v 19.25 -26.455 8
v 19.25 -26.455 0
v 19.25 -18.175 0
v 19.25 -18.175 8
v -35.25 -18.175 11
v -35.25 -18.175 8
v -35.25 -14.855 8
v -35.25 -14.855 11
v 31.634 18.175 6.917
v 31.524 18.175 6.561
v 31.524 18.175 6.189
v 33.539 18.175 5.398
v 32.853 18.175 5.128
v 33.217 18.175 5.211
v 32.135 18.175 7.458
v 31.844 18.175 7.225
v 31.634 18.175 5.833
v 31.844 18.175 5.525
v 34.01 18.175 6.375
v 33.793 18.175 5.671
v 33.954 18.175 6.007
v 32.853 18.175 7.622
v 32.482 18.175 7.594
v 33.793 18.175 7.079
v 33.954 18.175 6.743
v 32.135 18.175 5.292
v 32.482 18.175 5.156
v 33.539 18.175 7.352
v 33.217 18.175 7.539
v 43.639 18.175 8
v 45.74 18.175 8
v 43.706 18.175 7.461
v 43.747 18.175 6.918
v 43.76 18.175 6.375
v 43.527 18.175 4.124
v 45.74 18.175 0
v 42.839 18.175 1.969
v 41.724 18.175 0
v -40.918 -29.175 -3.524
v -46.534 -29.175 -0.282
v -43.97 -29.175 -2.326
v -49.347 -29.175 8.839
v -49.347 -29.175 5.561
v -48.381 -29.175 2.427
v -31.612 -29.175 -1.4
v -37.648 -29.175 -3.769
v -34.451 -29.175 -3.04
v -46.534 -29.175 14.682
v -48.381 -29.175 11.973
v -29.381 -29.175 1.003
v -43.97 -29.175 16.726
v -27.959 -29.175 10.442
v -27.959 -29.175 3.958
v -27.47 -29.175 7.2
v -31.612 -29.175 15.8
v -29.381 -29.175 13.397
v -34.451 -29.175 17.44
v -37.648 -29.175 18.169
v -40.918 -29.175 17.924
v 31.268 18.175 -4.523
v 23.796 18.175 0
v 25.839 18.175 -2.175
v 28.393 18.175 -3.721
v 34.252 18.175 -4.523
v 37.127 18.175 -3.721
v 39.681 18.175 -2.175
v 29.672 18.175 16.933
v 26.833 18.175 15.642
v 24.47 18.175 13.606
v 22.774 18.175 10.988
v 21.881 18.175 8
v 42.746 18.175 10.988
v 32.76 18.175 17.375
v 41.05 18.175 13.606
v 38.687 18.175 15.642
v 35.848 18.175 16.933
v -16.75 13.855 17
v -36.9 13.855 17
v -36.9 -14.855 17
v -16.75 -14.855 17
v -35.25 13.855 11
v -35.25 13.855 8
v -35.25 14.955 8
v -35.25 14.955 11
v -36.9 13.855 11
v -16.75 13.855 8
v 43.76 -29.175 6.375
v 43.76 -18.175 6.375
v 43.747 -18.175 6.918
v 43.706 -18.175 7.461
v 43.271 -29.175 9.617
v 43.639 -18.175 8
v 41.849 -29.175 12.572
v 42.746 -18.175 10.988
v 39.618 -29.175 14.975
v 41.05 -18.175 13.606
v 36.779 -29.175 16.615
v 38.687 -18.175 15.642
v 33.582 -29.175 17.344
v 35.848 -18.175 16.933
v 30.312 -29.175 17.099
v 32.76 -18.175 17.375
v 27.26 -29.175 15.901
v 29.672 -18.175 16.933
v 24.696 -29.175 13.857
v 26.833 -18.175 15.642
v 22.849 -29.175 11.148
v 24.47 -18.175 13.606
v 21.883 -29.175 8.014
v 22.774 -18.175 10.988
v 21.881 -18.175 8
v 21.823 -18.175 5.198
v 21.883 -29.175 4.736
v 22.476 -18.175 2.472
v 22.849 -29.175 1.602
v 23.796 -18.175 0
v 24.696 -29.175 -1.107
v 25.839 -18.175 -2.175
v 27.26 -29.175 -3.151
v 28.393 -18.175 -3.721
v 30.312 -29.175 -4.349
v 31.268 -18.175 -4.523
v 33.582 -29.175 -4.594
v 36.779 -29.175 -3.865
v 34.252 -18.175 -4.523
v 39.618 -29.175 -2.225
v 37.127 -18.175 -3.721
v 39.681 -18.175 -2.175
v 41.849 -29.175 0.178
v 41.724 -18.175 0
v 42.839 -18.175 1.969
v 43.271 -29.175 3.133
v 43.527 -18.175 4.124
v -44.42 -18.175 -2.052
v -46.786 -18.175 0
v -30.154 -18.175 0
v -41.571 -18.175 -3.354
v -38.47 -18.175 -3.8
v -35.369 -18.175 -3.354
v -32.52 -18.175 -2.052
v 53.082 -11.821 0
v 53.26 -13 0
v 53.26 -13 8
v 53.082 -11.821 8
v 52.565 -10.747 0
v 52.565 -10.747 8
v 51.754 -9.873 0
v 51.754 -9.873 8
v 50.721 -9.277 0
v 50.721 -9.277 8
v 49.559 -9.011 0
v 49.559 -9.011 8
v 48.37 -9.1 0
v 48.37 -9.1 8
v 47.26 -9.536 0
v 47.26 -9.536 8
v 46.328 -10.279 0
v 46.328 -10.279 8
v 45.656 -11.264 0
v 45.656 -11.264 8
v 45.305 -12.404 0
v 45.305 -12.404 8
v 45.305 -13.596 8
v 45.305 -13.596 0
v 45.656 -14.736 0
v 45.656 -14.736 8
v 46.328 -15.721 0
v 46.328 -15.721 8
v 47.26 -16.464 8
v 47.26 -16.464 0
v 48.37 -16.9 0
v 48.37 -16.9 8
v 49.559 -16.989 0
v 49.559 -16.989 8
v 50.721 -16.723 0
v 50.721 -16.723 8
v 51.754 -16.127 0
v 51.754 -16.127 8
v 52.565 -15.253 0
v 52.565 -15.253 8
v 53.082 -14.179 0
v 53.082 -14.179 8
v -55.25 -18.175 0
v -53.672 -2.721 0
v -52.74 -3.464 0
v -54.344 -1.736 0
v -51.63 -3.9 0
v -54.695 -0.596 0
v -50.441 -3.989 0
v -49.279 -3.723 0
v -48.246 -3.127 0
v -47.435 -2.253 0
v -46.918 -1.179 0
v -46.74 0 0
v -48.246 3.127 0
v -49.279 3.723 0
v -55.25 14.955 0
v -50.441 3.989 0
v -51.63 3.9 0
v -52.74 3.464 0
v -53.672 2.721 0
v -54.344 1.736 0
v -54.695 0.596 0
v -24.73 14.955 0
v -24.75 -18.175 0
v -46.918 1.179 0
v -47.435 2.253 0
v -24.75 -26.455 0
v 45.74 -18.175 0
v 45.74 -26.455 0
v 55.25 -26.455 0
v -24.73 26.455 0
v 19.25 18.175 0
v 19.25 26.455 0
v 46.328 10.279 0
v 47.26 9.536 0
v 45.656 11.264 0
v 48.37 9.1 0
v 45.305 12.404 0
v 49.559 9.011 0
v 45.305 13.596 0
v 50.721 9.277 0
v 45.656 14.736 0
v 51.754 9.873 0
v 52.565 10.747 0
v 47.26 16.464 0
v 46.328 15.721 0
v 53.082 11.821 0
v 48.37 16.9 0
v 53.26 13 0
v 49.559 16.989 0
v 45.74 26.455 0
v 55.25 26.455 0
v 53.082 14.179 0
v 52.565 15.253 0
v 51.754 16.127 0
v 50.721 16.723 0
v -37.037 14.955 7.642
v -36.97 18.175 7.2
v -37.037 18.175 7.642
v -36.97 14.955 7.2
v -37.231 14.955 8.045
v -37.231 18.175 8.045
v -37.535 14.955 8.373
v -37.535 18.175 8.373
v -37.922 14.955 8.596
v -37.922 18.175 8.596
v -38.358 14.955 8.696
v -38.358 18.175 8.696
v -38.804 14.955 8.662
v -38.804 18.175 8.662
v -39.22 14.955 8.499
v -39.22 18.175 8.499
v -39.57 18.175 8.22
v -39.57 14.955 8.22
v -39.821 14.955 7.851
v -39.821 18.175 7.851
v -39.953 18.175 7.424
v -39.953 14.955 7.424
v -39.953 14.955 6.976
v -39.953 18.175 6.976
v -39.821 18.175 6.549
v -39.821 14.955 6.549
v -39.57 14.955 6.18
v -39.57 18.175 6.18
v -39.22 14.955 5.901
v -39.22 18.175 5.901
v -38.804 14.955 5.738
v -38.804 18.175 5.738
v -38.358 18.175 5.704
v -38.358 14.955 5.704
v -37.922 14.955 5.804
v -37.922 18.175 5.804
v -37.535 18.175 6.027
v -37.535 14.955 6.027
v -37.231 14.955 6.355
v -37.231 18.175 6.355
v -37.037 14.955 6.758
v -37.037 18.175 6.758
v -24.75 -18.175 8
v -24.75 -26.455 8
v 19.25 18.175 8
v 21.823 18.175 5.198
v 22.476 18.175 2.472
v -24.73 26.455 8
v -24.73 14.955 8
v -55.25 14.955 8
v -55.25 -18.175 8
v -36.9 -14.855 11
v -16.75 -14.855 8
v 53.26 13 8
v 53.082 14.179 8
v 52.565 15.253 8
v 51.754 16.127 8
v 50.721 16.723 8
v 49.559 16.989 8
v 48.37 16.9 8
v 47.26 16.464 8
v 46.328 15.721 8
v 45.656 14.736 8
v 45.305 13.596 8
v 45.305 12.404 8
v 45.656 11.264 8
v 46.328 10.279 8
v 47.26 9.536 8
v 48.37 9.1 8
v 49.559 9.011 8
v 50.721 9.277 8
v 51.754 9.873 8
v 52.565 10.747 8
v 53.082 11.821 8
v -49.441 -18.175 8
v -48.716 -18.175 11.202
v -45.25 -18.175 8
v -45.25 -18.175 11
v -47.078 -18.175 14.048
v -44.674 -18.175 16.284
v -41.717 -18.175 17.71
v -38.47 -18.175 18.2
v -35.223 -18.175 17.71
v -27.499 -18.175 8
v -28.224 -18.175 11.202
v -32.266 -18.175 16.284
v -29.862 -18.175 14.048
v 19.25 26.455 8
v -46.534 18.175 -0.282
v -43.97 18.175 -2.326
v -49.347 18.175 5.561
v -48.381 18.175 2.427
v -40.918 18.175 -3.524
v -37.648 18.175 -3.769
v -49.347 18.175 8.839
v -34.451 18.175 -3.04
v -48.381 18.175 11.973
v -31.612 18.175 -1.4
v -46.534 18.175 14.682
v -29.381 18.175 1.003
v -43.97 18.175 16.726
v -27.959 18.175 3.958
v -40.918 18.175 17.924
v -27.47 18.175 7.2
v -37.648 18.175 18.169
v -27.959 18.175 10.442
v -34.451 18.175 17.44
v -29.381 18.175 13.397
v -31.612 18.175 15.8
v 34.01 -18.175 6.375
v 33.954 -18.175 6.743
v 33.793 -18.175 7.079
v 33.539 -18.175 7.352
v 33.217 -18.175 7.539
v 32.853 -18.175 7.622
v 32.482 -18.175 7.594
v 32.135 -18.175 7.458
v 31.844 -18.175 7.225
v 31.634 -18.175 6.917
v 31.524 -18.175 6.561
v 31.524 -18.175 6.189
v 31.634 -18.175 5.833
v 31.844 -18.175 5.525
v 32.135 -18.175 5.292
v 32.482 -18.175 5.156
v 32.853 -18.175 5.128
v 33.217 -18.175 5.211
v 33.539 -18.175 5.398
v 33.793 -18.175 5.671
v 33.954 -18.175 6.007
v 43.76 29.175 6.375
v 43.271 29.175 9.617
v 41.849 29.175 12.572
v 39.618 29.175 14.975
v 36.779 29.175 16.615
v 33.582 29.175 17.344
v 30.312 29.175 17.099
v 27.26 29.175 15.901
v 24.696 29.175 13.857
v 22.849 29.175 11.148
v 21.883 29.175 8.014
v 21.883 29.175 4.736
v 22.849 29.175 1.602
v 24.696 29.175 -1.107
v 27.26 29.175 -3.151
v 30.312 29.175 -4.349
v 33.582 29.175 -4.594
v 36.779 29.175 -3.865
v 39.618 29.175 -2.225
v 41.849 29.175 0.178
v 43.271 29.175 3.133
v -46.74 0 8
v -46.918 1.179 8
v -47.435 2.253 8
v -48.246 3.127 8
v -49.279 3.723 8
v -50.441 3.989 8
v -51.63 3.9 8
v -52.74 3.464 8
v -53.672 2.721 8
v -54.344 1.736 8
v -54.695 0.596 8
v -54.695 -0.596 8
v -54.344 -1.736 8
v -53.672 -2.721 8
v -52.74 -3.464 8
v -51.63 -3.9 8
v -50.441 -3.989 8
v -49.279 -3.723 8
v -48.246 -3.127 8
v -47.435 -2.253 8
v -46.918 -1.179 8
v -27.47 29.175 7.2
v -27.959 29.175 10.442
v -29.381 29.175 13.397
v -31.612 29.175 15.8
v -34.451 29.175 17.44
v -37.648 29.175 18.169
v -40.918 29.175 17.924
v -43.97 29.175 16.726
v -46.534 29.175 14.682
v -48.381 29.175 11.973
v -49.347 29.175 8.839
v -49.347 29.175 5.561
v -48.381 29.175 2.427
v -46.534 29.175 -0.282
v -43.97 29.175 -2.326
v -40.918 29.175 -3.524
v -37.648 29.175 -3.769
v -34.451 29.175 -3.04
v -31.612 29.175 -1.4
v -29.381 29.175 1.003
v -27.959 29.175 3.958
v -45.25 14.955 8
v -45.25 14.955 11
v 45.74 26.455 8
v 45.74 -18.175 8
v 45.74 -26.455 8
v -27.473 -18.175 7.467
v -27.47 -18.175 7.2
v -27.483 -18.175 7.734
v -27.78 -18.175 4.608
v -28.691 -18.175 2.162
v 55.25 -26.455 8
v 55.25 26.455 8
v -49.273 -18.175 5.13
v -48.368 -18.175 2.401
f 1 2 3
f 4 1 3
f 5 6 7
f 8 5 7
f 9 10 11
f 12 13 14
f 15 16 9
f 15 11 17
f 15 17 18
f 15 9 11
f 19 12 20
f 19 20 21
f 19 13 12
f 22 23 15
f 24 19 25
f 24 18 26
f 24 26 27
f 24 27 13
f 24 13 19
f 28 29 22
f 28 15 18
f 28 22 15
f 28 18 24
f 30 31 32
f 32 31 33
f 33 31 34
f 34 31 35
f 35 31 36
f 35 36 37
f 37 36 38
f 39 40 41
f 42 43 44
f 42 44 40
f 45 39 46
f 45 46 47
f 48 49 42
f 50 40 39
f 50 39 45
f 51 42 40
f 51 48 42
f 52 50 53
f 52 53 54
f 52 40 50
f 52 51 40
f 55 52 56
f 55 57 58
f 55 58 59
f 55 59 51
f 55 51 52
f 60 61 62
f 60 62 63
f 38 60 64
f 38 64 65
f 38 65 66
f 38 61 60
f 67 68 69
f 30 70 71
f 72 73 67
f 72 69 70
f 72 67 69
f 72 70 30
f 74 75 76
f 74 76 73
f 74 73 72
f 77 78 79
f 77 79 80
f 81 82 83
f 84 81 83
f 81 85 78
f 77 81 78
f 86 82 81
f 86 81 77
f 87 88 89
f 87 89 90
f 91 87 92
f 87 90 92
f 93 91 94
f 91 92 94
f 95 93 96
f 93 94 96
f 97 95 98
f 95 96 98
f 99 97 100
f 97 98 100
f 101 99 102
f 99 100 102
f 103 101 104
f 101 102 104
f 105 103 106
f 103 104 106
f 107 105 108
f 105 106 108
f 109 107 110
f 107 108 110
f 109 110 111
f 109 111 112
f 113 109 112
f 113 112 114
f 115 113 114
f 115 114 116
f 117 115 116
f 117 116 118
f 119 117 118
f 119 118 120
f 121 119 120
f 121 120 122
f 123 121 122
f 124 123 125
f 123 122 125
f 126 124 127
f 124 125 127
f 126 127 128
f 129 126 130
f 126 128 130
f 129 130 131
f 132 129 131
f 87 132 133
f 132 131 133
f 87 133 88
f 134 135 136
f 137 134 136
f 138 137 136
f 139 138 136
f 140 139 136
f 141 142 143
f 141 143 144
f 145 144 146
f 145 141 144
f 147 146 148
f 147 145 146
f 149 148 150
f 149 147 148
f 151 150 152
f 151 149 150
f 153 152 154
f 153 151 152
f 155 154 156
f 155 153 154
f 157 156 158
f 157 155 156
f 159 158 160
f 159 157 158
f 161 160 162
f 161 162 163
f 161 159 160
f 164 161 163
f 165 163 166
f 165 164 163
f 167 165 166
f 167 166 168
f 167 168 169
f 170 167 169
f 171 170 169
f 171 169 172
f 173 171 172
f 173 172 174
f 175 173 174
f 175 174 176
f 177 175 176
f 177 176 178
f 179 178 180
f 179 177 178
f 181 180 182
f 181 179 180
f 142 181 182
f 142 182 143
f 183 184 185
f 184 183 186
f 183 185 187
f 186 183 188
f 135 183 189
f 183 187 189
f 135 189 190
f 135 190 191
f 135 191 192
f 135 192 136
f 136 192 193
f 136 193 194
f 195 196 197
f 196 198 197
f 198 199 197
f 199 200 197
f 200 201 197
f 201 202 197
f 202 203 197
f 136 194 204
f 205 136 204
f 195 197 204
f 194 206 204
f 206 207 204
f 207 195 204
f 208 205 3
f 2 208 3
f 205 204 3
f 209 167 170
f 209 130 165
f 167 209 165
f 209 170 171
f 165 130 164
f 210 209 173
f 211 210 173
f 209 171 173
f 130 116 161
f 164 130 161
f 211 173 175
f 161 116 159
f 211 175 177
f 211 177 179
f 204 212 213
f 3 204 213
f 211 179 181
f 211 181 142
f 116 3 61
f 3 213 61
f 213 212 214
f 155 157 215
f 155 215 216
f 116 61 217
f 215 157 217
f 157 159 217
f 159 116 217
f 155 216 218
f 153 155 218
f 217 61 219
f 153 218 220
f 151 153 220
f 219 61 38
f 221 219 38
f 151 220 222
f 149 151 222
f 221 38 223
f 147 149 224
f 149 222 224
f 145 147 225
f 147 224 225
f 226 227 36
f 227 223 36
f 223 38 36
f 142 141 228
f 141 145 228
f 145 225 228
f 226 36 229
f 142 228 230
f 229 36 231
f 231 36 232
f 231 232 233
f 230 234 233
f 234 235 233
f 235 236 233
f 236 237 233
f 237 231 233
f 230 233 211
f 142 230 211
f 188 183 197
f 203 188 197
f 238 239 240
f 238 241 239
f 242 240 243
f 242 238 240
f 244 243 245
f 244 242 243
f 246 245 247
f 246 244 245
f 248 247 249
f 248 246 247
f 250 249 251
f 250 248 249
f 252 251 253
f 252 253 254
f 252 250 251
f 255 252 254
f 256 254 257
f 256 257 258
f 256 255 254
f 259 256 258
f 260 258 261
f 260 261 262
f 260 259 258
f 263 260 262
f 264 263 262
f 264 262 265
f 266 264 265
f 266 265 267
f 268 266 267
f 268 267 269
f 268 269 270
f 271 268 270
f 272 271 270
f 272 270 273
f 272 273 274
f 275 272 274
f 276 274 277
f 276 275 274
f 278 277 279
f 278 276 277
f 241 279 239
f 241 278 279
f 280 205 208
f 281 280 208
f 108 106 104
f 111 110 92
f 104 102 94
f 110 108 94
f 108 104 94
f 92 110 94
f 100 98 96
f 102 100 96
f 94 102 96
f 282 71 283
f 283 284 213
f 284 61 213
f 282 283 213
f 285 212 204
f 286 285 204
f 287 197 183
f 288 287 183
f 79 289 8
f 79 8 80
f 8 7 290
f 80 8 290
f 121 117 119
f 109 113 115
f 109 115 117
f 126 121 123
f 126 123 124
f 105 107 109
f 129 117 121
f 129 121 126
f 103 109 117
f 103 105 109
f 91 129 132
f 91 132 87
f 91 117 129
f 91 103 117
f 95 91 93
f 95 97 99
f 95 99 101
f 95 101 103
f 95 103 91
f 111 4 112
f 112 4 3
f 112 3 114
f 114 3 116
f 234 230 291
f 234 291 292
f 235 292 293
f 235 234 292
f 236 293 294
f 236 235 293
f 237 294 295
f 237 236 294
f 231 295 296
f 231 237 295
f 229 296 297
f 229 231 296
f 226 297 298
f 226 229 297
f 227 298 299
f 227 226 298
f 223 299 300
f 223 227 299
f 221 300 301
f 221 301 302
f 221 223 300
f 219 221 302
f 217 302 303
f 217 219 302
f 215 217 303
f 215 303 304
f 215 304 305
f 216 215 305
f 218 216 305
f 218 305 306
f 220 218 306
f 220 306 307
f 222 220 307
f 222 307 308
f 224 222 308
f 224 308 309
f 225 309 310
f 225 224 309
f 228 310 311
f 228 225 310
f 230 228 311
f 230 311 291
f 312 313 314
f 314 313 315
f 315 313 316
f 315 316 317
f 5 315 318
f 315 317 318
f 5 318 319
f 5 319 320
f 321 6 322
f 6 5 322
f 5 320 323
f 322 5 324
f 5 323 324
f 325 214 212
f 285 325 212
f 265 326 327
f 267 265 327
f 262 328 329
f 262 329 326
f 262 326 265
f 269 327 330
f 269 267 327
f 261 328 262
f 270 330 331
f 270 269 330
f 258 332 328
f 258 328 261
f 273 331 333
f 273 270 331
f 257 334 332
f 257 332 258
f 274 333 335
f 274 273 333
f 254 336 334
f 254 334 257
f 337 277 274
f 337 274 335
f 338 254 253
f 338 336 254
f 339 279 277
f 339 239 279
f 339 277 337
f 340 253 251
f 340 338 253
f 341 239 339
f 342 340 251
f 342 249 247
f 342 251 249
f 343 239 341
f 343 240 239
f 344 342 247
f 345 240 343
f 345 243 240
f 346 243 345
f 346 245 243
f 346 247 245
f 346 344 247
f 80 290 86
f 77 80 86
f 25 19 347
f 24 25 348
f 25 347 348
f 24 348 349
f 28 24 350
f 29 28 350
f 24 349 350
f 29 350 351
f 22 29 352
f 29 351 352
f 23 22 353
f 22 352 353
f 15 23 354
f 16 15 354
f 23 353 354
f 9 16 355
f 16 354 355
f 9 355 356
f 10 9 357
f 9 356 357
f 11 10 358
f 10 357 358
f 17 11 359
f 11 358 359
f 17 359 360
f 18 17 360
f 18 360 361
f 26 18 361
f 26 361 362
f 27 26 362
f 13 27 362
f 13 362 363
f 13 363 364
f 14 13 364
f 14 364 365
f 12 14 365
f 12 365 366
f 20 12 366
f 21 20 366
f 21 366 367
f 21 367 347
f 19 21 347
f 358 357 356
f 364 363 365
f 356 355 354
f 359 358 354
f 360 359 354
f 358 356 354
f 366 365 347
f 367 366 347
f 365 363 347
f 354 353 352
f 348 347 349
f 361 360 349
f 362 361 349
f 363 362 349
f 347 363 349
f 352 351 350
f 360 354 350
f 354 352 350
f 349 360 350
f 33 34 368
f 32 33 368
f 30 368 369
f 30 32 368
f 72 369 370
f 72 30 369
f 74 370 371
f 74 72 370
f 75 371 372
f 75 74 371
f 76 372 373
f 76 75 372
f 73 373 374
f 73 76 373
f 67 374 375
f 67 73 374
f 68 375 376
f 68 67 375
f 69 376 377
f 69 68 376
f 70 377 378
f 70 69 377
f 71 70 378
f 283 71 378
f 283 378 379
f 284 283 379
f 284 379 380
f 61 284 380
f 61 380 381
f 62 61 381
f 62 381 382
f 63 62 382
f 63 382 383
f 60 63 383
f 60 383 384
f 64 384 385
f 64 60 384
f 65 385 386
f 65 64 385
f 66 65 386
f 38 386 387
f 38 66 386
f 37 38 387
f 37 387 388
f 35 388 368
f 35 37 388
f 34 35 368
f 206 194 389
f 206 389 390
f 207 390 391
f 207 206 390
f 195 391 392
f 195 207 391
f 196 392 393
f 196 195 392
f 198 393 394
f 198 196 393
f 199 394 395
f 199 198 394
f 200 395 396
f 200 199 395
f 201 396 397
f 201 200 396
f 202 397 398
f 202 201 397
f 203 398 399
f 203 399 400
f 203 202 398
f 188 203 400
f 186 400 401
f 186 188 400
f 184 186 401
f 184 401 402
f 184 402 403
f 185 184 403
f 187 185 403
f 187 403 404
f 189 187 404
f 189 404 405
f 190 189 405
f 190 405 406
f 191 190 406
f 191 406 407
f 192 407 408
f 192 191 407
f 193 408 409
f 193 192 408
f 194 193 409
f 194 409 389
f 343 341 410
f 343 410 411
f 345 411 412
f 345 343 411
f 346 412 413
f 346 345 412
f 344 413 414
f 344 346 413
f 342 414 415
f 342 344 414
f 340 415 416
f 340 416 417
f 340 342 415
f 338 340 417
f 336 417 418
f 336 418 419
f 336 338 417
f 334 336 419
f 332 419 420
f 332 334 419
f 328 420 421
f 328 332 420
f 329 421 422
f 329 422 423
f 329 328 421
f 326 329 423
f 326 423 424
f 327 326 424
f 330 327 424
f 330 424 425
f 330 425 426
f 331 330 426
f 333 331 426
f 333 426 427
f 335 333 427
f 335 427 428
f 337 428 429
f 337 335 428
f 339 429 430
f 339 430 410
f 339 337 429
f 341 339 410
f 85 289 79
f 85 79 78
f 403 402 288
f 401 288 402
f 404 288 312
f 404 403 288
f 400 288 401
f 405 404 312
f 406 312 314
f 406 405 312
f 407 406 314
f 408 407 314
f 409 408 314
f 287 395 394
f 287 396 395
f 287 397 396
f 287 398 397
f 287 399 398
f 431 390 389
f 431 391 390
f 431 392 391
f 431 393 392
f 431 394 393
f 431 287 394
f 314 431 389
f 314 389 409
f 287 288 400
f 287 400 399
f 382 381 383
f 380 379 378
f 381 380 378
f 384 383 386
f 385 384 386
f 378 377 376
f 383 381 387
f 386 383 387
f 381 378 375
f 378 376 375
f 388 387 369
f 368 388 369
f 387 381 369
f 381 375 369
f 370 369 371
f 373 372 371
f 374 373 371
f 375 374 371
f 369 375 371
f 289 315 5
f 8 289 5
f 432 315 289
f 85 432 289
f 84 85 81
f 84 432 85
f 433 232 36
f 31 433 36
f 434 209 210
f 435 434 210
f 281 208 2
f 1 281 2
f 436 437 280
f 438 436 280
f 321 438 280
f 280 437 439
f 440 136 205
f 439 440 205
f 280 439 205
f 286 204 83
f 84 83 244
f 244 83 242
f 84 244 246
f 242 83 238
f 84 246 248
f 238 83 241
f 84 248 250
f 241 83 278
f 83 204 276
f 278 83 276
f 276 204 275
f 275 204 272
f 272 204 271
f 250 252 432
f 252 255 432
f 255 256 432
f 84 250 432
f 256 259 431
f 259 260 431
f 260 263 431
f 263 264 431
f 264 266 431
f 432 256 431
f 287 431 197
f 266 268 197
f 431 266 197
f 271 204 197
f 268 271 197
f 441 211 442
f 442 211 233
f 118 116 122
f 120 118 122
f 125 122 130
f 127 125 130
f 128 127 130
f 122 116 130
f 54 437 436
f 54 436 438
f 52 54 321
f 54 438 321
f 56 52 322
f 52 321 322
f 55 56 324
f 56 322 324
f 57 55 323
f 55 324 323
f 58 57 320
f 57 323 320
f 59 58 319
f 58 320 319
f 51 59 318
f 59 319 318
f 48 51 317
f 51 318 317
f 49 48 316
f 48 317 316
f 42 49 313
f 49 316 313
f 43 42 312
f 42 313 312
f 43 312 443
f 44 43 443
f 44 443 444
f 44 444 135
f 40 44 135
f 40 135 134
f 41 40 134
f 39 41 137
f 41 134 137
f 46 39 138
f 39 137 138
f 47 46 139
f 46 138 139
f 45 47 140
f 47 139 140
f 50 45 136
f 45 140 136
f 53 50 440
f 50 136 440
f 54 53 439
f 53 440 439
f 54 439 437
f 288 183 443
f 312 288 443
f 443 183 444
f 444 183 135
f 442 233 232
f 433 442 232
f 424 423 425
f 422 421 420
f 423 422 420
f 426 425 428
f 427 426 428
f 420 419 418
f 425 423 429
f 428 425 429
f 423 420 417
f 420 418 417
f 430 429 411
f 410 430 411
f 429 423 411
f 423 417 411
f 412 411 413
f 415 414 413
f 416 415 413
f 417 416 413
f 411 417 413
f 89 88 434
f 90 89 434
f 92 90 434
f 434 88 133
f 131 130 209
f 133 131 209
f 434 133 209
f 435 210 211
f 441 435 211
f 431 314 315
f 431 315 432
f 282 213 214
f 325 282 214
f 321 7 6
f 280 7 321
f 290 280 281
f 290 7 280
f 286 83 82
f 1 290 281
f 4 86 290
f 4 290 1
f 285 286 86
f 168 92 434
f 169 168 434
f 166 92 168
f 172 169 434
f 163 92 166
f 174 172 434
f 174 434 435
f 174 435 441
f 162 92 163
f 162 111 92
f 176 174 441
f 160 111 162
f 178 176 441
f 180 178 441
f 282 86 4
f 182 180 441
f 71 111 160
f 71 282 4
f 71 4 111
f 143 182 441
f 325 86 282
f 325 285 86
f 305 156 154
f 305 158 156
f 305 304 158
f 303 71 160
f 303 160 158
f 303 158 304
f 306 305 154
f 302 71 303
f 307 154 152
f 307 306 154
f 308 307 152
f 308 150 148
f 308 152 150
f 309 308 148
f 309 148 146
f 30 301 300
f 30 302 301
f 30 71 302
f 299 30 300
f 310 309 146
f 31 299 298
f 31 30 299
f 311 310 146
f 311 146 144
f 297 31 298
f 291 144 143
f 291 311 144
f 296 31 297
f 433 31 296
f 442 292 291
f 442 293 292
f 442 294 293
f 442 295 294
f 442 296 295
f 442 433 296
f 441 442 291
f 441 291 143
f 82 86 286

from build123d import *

# Parameters (mm, degrees)
F0_R      = 4
F1_DEPTH  = 8
F2_W      = 10
F2_H      = 33.13
F3_DEPTH  = 3
F4_R      = 1.5
F5_DEPTH  = 26
F6_W      = 20.15
F6_H      = 28.71
F7_DEPTH  = 9
F8_R      = 11
F9_DEPTH  = 11
F10_R     = 1.25
F11_DEPTH = 47.351
F12_R     = 11
F13_DEPTH = 11


# Not quite as in the source:
# - a pattern or mirror of a feature is missing from the dataset's text; its kind, count and spacing are read off the source's solid


with BuildPart() as f1:
    # F0 (on Top) → F1 (new body)
    with BuildSketch(Plane.XY):
        Polygon((55.25, -26.455), (55.25, 26.455), (45.74, 26.455), (45.74, 18.175), (19.25, 18.175), (19.25, 26.455), (-24.73, 26.455), (-24.73, 14.955), (-55.25, 14.955), (-55.25, -18.175), (-24.75, -18.175), (-24.75, -26.455), (19.25, -26.455), (19.25, -18.175), (45.74, -18.175), (45.74, -26.455), align=None)
        with Locations((49.26, -13)):
            Circle(F0_R, mode=Mode.SUBTRACT)
        with Locations((-50.74, 0)):
            Circle(F0_R, mode=Mode.SUBTRACT)
        with Locations((49.26, 13)):
            Circle(F0_R, mode=Mode.SUBTRACT)
    extrude(amount=F1_DEPTH)

    # F2 (on face) → F3 (join)
    with BuildSketch(Plane.XY.offset(8)):
        with Locations((-40.25, -1.61)):
            Rectangle(F2_W, F2_H)
    extrude(amount=F3_DEPTH)

    # F4 (on Front) → F5 (join, symmetric)
    with BuildSketch(Plane.XZ):
        with Locations((-38.47, 7.2)):
            Circle(F4_R)
    extrude(amount=F5_DEPTH, both=True)

    # F6 (on face) → F7 (join)
    with BuildSketch(Plane.XY.offset(8)):
        with Locations((-26.825, -0.5)):
            Rectangle(F6_W, F6_H)
    extrude(amount=F7_DEPTH)

    # F8 (on face) → F9 (join)
    with BuildSketch(Plane.XZ.offset(18.175)):
        with Locations((-38.47, 7.2)):
            Circle(F8_R)
    f9 = extrude(amount=F9_DEPTH)

    # F9_copies: F9 across plane
    add(f9.mirror(Plane.ZX))

    # F10 (on face) → F11 (cut, through all)
    with BuildSketch(Plane.XZ.offset(18.175)):
        with Locations((32.76, 6.375)):
            Circle(F10_R)
    extrude(amount=-F11_DEPTH, mode=Mode.SUBTRACT)

    # F12 (on face) → F13 (join)
    with BuildSketch(Plane.XZ.offset(18.175)):
        with Locations((32.76, 6.375)):
            Circle(F12_R)
    f13 = extrude(amount=F13_DEPTH)

    # F13_copies: F13 across plane
    add(f13.mirror(Plane.ZX))


solid = f1.part
